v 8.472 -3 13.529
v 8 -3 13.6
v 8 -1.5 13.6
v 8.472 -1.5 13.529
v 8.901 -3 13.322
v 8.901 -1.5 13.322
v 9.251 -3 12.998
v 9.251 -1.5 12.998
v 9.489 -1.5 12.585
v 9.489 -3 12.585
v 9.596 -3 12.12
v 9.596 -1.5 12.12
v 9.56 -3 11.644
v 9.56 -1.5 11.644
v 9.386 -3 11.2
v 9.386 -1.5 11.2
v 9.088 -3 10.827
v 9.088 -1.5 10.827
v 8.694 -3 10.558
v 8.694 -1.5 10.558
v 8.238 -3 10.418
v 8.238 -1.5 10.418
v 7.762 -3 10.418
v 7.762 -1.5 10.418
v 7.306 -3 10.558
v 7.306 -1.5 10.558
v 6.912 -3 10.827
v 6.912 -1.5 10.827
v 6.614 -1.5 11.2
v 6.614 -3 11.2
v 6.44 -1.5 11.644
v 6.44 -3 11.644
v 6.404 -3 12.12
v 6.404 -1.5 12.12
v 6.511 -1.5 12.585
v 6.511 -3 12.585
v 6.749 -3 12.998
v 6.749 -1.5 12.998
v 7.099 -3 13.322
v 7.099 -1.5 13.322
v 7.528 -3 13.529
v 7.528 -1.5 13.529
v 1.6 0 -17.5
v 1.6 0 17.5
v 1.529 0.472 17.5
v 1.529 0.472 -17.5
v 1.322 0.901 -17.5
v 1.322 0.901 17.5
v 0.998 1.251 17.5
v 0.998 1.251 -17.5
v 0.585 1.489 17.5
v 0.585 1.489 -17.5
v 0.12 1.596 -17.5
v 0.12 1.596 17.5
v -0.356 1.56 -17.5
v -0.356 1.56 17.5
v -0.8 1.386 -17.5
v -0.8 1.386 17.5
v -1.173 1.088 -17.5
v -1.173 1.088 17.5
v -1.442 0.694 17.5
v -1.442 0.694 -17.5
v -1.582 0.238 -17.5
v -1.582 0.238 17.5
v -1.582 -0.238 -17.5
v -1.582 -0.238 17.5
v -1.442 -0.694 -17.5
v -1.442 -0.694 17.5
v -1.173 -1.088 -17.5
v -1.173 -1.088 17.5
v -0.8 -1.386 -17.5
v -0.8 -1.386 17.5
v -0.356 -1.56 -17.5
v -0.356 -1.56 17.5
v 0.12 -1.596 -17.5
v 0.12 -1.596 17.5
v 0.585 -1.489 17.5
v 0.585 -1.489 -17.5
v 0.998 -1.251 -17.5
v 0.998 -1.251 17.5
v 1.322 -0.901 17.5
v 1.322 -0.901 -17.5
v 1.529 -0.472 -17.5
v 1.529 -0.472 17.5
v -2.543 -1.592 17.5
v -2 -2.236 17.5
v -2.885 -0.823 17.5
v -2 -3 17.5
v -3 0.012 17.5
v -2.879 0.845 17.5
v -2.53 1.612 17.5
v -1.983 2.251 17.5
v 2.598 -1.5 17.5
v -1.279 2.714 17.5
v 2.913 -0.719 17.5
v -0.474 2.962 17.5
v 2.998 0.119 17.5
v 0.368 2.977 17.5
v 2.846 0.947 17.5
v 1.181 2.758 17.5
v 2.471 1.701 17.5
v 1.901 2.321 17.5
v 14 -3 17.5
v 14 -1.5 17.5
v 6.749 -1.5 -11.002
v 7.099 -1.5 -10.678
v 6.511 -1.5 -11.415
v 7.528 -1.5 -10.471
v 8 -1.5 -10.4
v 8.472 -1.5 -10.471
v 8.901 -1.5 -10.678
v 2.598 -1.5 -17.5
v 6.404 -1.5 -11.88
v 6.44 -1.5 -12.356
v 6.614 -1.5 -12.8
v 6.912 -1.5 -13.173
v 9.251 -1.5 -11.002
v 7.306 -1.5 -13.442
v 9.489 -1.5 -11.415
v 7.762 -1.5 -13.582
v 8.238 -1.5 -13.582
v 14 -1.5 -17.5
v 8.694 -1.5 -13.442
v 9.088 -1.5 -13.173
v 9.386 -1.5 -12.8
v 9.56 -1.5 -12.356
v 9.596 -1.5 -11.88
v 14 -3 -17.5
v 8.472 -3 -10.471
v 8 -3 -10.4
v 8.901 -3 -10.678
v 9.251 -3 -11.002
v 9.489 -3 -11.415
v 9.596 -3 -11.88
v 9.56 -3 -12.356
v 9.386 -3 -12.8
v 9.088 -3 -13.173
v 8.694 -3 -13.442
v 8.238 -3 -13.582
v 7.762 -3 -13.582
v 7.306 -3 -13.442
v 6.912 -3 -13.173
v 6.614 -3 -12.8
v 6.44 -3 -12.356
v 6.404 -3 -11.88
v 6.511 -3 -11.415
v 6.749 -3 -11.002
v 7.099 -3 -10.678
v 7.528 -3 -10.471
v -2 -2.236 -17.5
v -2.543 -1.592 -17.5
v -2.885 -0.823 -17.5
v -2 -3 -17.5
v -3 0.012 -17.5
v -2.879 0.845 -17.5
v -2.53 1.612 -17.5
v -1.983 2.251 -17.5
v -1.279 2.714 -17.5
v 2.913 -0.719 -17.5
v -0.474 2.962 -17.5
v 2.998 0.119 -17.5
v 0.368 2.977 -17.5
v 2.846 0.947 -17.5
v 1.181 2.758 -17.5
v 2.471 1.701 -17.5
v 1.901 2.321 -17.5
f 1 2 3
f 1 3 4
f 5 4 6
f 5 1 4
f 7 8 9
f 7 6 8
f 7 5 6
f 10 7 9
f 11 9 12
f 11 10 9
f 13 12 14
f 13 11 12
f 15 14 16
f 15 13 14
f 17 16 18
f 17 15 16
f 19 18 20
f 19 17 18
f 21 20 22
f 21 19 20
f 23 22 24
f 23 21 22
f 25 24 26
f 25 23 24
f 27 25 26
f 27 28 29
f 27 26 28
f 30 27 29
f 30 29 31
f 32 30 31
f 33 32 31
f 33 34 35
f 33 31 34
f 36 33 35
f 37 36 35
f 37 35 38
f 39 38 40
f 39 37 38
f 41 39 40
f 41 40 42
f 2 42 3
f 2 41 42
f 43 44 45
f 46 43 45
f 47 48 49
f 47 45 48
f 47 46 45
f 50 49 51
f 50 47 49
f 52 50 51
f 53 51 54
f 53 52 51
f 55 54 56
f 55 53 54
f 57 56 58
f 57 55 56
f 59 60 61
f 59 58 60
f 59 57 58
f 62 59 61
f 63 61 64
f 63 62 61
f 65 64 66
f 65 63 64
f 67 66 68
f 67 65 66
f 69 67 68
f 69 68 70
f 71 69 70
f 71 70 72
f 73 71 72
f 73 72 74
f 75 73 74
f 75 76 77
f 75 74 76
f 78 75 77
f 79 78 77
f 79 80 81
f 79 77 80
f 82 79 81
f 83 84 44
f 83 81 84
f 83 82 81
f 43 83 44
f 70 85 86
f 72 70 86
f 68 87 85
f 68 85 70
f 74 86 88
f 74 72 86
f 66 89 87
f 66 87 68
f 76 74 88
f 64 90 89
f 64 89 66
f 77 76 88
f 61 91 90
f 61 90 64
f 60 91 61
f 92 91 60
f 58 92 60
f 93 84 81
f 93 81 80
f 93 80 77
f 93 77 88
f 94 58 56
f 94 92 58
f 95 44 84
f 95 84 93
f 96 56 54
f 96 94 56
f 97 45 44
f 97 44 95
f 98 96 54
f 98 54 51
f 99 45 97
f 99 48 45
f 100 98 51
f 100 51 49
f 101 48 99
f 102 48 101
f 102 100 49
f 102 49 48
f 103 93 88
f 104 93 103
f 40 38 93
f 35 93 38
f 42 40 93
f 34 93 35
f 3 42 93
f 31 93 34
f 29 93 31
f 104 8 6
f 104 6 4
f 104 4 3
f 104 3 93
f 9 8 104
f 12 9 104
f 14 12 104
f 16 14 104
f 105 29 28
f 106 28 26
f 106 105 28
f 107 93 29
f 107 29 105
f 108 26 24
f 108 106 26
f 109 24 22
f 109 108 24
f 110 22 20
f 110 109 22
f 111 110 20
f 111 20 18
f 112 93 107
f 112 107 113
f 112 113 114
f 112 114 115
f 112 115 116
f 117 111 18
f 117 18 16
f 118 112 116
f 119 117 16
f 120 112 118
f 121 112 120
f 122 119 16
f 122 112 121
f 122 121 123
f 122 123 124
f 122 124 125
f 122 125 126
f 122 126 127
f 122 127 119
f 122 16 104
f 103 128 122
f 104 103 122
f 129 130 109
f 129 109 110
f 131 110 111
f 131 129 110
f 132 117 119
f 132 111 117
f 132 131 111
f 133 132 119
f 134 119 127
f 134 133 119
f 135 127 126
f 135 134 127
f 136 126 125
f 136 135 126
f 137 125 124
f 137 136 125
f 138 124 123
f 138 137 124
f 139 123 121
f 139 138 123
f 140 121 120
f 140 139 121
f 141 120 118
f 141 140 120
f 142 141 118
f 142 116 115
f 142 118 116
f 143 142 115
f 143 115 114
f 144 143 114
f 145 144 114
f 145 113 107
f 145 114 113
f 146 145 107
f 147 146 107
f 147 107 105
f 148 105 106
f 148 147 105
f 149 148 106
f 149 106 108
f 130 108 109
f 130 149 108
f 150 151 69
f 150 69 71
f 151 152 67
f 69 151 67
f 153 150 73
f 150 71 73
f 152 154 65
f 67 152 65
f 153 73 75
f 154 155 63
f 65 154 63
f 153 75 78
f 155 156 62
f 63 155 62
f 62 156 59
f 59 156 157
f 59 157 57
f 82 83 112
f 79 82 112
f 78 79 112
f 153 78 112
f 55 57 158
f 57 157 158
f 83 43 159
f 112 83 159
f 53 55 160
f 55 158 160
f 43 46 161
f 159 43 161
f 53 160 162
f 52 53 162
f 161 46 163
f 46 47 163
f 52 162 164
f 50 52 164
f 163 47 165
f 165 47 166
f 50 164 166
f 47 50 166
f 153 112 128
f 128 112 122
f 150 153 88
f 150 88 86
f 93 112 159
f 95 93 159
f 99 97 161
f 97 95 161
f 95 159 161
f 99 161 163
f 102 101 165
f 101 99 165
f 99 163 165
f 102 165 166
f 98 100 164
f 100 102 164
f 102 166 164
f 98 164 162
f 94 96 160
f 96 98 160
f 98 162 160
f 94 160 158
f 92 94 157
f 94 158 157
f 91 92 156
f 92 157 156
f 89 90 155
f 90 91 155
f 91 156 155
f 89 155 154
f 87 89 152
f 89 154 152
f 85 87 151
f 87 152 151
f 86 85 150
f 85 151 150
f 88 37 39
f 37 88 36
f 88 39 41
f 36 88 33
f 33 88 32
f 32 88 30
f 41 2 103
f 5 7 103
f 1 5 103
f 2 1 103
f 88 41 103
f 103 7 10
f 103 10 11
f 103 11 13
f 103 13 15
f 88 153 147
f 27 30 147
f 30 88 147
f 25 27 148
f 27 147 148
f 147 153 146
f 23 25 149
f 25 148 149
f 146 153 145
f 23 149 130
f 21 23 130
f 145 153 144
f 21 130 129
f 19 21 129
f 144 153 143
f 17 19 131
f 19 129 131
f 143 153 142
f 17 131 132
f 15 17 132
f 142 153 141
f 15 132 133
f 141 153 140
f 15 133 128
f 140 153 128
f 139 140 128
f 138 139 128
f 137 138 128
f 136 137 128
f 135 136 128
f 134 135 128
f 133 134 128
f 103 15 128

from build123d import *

# Parameters (mm, degrees)
EXTRUDE_START             = -17.5
SKETCH_1_R                = 3
EXTRUDE_231_DEPTH         = 35
SKETCH_2_W                = 16
SKETCH_2_H                = 1.5
EXTRUDE_300_DEPTH         = 35
D3P2_START                = -20
SKETCH_3_R                = 1.6
D3P2_DEPTH                = 40
CUT_EXTRUDE_M3_DEPTH      = 100
CUT_EXTRUDE_M3_DEPTH_BACK = 100
SKETCH_4_R                = 1.6
CUT_EXTRUDE_3_DEPTH       = 100
CUT_EXTRUDE_3_DEPTH_BACK  = 100
SKETCH_5_R                = 1.6


with BuildPart() as part:
    # 草图1 → Extrude 231 (new body)
    with BuildSketch(Plane.XY.offset(EXTRUDE_START)):
        Circle(SKETCH_1_R)
    extrude(amount=EXTRUDE_231_DEPTH)

    # 草图2 → Extrude 300 (add)
    with BuildSketch(Plane.XY.offset(EXTRUDE_START)):
        with Locations((6, -2.25)):
            Rectangle(SKETCH_2_W, SKETCH_2_H)
    extrude(amount=EXTRUDE_300_DEPTH)

    # 草图3 → D3p2活动转轴孔 (cut)
    with BuildSketch(Plane.XY.offset(D3P2_START)):
        Circle(SKETCH_3_R)
    extrude(amount=D3P2_DEPTH, mode=Mode.SUBTRACT)

    # 草图4 → 吊板M3安装孔 (cut, two sides: drawn at the far end of the back side and taken through both)
    with BuildSketch(Plane(origin=(0, 0, 0), x_dir=(1, 0, 0), z_dir=(0, 1, 0)).offset(-CUT_EXTRUDE_M3_DEPTH_BACK)):
        with Locations(Location((8, 12, 0), (0, 0, 270))):
            Circle(SKETCH_4_R)
    extrude(amount=CUT_EXTRUDE_M3_DEPTH + CUT_EXTRUDE_M3_DEPTH_BACK, mode=Mode.SUBTRACT)

    # 草图5 → 切除-拉伸3 (cut, two sides: drawn at the far end of the back side and taken through both)
    with BuildSketch(Plane(origin=(0, 0, 0), x_dir=(1, 0, 0), z_dir=(0, 1, 0)).offset(-CUT_EXTRUDE_3_DEPTH_BACK)):
        with Locations(Location((8, -12, 0), (0, 0, 270))):
            Circle(SKETCH_5_R)
    extrude(amount=CUT_EXTRUDE_3_DEPTH + CUT_EXTRUDE_3_DEPTH_BACK, mode=Mode.SUBTRACT)


solid = part.part
